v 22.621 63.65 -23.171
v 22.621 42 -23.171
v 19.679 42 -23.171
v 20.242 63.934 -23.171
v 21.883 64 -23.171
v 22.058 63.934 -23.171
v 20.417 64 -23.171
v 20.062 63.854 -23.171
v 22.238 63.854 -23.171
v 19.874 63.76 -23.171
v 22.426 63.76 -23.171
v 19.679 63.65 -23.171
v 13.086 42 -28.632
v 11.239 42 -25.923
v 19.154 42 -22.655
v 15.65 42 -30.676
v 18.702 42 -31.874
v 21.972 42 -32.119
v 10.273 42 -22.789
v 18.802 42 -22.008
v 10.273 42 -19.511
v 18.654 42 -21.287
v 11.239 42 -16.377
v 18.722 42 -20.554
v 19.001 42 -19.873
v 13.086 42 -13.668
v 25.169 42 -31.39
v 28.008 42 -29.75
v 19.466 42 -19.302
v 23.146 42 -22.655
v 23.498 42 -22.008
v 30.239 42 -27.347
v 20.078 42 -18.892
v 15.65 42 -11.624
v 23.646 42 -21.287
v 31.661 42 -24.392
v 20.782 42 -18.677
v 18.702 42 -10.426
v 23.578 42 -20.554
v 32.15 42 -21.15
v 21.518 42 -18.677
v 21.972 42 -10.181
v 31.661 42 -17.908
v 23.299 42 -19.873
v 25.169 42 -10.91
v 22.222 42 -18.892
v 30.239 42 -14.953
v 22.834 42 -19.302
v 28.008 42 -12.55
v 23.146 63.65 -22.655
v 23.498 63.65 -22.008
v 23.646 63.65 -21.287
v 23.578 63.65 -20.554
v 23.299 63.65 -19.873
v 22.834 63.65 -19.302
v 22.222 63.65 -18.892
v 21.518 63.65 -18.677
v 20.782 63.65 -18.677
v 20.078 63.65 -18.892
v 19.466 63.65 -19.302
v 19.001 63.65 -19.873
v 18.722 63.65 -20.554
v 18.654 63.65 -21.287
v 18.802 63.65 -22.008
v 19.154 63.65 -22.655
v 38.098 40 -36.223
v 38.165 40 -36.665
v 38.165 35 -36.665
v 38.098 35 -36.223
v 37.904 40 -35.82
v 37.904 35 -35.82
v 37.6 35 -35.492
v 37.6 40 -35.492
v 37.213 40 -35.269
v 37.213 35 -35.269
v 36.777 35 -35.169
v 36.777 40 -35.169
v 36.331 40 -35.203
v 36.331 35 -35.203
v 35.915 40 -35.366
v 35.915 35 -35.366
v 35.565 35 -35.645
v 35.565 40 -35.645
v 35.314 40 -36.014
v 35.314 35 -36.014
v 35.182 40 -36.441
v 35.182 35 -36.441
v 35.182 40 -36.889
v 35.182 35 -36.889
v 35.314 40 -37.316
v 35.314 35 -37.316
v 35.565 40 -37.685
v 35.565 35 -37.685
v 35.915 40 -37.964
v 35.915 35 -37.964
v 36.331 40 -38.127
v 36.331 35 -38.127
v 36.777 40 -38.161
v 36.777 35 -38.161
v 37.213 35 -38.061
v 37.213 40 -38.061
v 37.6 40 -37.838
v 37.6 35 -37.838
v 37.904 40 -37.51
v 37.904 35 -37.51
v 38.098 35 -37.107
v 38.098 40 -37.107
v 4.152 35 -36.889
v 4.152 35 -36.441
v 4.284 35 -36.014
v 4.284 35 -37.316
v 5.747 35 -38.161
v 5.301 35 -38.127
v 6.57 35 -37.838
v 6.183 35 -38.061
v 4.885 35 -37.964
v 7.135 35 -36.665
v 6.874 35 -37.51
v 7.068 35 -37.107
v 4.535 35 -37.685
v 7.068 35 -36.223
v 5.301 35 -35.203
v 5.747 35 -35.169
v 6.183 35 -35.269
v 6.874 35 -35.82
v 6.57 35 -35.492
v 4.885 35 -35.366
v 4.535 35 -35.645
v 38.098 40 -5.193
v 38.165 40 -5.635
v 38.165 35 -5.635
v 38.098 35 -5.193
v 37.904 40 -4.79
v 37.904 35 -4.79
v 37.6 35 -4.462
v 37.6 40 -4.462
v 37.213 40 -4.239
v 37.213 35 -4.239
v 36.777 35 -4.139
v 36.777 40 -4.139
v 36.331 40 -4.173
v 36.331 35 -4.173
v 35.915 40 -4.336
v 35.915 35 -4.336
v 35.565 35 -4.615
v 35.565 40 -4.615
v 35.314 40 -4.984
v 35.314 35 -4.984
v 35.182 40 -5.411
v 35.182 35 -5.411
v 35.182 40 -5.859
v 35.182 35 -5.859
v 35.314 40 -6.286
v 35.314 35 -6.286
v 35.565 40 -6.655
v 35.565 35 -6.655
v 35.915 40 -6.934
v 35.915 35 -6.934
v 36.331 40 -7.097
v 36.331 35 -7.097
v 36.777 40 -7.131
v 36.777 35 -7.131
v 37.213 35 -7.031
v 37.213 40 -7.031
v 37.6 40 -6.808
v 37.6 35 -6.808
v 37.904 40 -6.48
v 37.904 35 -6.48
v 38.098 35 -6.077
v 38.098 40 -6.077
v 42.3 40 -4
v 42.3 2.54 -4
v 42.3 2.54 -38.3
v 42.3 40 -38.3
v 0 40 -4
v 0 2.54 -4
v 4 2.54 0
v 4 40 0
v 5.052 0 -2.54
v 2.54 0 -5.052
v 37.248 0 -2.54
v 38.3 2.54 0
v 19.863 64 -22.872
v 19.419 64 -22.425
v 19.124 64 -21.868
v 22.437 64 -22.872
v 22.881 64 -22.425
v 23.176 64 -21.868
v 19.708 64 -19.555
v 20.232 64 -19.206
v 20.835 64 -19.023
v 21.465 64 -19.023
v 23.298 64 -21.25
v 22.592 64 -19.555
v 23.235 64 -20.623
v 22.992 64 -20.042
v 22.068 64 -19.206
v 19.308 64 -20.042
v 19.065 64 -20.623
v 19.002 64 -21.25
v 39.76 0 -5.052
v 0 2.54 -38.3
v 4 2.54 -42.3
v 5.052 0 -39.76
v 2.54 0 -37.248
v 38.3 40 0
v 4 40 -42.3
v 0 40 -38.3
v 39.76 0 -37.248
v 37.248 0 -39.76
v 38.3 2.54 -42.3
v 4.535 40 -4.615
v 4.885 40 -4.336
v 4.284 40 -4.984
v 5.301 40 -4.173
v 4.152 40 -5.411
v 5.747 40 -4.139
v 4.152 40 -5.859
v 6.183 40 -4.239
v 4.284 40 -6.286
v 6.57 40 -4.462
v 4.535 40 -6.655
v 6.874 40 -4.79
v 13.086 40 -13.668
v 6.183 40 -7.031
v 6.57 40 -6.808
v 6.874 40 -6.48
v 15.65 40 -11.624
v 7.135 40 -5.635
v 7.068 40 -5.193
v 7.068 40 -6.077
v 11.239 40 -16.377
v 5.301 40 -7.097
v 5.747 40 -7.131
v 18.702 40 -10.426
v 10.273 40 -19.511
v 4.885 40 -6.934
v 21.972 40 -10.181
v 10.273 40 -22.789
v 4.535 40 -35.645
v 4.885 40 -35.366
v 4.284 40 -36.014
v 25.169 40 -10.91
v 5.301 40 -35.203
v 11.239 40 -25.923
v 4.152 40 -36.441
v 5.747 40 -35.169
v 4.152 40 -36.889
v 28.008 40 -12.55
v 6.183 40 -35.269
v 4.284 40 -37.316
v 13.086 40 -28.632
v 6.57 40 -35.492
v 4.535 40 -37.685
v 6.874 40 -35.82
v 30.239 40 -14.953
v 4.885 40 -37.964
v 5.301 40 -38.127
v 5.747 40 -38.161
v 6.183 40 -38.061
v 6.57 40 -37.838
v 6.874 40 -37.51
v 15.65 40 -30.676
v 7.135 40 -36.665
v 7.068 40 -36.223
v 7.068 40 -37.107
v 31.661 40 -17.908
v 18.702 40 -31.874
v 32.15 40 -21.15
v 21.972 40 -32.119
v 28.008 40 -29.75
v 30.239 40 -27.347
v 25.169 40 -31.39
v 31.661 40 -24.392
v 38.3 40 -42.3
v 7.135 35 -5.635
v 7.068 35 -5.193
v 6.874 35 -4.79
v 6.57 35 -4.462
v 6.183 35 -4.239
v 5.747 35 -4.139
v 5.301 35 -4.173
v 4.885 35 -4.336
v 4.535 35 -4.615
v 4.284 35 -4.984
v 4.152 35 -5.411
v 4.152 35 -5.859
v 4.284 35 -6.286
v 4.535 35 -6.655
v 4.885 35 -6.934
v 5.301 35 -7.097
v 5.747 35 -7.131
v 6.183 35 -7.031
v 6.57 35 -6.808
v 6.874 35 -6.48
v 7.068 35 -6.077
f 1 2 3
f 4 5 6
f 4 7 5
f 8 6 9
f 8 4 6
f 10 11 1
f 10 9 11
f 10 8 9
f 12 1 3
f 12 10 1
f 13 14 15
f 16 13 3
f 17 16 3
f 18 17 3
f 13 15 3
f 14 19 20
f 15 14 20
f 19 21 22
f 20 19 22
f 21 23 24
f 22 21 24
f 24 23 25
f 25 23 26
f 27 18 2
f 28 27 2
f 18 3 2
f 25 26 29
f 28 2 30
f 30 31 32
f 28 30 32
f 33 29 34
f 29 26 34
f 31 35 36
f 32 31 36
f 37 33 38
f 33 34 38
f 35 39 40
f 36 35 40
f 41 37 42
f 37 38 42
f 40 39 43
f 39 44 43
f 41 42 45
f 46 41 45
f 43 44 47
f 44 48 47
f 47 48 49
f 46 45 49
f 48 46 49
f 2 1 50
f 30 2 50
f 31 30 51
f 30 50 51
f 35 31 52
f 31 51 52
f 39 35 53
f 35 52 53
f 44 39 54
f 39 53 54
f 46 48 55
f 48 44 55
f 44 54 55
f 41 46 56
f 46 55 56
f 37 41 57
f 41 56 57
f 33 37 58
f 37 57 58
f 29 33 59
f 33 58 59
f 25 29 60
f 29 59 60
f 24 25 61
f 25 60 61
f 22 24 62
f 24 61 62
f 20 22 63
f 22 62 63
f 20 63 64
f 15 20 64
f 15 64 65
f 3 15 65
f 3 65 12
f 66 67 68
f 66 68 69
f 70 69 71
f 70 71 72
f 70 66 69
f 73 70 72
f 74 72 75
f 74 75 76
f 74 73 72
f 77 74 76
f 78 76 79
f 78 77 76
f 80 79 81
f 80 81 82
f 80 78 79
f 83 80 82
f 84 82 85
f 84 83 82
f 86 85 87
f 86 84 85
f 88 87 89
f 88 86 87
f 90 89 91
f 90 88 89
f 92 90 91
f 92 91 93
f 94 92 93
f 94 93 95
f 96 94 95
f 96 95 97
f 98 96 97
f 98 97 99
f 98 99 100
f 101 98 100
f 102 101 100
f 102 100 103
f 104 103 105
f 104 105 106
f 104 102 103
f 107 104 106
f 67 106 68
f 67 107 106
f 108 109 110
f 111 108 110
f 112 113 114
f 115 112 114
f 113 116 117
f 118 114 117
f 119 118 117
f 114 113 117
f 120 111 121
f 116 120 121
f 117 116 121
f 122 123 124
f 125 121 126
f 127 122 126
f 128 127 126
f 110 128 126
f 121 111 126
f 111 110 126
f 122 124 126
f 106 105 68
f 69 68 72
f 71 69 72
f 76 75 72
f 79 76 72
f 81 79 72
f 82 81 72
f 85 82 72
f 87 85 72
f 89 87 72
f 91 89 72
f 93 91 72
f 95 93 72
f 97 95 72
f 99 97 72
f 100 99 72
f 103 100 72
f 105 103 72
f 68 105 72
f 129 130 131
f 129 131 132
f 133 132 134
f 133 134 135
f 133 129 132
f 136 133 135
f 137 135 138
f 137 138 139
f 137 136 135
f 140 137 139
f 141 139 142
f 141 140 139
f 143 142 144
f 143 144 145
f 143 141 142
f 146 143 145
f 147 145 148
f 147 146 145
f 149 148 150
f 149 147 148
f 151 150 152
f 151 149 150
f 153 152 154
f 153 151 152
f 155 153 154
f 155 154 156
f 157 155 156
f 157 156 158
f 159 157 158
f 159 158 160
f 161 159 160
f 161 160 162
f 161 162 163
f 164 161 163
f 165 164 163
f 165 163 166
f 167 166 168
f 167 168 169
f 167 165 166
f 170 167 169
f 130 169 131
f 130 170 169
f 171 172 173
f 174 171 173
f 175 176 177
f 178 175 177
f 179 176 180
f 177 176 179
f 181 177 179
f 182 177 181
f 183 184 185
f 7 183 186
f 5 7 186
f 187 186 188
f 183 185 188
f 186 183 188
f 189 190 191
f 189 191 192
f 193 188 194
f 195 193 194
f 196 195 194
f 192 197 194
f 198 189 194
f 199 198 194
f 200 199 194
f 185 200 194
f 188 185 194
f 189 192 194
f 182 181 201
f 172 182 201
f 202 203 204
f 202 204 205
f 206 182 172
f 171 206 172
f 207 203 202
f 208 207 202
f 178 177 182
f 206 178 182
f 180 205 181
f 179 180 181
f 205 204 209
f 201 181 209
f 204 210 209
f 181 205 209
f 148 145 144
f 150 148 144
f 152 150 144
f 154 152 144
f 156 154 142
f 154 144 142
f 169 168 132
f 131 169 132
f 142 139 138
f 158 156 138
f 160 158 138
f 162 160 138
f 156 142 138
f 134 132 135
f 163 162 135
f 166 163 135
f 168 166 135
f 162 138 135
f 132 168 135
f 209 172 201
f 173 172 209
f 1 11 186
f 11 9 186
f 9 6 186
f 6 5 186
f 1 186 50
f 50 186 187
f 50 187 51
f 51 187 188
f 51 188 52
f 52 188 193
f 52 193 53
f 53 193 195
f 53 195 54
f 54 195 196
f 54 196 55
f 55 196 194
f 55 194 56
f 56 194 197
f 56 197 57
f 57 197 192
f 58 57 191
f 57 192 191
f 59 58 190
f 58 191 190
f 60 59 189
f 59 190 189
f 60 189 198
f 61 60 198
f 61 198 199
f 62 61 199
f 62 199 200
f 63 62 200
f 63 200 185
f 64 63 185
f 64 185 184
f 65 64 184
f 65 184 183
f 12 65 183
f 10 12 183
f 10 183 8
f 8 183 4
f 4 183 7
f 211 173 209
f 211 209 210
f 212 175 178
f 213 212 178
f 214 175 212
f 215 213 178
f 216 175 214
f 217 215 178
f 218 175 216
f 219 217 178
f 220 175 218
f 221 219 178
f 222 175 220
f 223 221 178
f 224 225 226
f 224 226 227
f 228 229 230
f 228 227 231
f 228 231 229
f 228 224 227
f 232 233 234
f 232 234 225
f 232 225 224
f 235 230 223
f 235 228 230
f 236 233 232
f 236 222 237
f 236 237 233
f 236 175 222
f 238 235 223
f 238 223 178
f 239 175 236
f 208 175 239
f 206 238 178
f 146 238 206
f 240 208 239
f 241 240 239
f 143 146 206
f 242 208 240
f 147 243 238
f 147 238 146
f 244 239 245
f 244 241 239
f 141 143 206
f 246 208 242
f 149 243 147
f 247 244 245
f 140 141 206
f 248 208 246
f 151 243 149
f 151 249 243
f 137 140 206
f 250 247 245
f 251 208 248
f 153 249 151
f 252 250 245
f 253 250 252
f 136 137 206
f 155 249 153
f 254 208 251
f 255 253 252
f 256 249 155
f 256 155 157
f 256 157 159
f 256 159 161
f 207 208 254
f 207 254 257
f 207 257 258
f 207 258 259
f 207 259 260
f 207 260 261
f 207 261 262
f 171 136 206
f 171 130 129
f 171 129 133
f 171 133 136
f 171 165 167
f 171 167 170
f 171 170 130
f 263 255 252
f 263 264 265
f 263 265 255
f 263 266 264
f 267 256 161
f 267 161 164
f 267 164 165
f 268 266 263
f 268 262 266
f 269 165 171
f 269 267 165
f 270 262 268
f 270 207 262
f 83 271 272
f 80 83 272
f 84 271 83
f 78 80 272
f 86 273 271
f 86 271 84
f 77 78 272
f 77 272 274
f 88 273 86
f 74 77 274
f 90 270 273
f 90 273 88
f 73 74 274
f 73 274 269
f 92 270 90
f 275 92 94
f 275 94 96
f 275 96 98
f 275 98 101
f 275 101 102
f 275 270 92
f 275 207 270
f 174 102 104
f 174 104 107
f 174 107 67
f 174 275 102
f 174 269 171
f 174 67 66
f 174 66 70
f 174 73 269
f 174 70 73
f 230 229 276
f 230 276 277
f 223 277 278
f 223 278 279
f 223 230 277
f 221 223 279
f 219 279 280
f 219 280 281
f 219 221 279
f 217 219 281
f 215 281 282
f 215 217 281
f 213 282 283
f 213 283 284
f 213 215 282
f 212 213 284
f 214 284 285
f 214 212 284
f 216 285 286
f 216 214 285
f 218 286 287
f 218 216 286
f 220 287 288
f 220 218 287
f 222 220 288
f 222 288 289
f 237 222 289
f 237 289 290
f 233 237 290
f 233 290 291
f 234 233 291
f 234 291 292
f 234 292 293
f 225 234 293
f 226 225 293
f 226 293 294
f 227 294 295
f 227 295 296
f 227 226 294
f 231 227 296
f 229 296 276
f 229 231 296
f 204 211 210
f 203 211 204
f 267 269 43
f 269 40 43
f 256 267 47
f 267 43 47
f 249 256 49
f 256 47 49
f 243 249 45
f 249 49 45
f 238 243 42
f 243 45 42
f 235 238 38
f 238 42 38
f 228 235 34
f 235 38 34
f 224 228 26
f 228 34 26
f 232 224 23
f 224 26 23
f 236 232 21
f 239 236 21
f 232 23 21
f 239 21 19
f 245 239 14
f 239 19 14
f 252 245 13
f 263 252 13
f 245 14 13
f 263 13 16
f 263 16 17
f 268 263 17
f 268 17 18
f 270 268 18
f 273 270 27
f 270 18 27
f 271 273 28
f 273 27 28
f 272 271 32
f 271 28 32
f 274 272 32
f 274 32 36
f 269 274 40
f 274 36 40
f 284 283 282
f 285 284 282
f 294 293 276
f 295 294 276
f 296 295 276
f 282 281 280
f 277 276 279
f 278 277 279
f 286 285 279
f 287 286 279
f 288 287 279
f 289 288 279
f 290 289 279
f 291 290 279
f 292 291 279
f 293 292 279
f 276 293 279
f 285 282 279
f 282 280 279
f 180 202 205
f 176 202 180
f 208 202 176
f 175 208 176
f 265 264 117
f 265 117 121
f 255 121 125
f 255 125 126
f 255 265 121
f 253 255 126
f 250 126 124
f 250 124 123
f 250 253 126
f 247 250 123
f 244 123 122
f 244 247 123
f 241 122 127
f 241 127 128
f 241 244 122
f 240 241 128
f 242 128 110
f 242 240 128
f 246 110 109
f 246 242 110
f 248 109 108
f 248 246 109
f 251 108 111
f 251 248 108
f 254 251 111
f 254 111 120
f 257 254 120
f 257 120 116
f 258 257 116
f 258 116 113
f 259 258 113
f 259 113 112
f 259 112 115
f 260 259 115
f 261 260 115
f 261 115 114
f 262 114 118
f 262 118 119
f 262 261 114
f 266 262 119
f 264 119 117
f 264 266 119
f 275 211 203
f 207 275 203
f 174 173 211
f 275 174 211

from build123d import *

# Parameters (mm, degrees)
BOSS_EXTRUDE1_DEPTH = 40
SKETCH2_R           = 1.5
CUT_EXTRUDE1_DEPTH  = 5
CHAMFER1_SIZE       = 0.35
D_SHAFT_DEPTH       = 22
CHAMFER2_SIZE       = 2.54


with BuildPart() as part:
    # Sketch1 → Boss-Extrude1 (new body)
    with BuildSketch(Plane(origin=(0, 0, 0), x_dir=(1, 0, 0), z_dir=(0, 1, 0))):
        Polygon((4, 42.3), (0, 38.3), (0, 4), (4, 0), (38.3, 0), (42.3, 4), (42.3, 38.3), (38.3, 42.3), align=None)
    extrude(amount=BOSS_EXTRUDE1_DEPTH)

    # Sketch2 → Cut-Extrude1 (cut)
    with BuildSketch(Plane.XZ.offset(-40)):
        with Locations((5.635, -5.635)):
            Circle(SKETCH2_R)
        with Locations((36.665, -5.635)):
            Circle(SKETCH2_R)
        with Locations((36.665, -36.665)):
            Circle(SKETCH2_R)
        with Locations((5.635, -36.665)):
            Circle(SKETCH2_R)
    extrude(amount=CUT_EXTRUDE1_DEPTH, mode=Mode.SUBTRACT)

    # Sketch6 → Revolve1 (revolve)
    with BuildSketch(Plane.XY.offset(-21.15)):
        Polygon((21.15, 40), (32.15, 40), (32.15, 42), (23.65, 42), (23.65, 64), (21.15, 64), align=None)
    revolve(axis=Axis((21.15, 64, -21.15), (0, -1, 0)))

    # Chamfer1
    chamfer1_edges = [part.edges().sort_by_distance(p)[0] for p in [
        (18.65, 64, -21.15),
    ]]
    chamfer(chamfer1_edges, length=CHAMFER1_SIZE)

    # Sketch7 → D shaft (cut)
    with BuildSketch(Plane(origin=(0, 64, 0), x_dir=(1, 0, 0), z_dir=(0, 1, 0))):
        with BuildLine():
            Line((22.621309131, 23.1712), (19.678690869, 23.1712))
            ThreePointArc((19.678690869, 23.1712), (21.15, 23.65), (22.621309131, 23.1712))
        make_face()
    extrude(amount=-D_SHAFT_DEPTH, mode=Mode.SUBTRACT)

    # Chamfer2
    chamfer2_edges = [part.edges().sort_by_distance(p)[0] for p in [
        (2, 0, -40.3),
        (21.15, 0, -42.3),
        (40.3, 0, -40.3),
        (42.3, 0, -21.15),
        (40.3, 0, -2),
        (21.15, 0, 0),
        (2, 0, -2),
        (0, 0, -21.15),
    ]]
    chamfer(chamfer2_edges, length=CHAMFER2_SIZE)


solid = part.part
